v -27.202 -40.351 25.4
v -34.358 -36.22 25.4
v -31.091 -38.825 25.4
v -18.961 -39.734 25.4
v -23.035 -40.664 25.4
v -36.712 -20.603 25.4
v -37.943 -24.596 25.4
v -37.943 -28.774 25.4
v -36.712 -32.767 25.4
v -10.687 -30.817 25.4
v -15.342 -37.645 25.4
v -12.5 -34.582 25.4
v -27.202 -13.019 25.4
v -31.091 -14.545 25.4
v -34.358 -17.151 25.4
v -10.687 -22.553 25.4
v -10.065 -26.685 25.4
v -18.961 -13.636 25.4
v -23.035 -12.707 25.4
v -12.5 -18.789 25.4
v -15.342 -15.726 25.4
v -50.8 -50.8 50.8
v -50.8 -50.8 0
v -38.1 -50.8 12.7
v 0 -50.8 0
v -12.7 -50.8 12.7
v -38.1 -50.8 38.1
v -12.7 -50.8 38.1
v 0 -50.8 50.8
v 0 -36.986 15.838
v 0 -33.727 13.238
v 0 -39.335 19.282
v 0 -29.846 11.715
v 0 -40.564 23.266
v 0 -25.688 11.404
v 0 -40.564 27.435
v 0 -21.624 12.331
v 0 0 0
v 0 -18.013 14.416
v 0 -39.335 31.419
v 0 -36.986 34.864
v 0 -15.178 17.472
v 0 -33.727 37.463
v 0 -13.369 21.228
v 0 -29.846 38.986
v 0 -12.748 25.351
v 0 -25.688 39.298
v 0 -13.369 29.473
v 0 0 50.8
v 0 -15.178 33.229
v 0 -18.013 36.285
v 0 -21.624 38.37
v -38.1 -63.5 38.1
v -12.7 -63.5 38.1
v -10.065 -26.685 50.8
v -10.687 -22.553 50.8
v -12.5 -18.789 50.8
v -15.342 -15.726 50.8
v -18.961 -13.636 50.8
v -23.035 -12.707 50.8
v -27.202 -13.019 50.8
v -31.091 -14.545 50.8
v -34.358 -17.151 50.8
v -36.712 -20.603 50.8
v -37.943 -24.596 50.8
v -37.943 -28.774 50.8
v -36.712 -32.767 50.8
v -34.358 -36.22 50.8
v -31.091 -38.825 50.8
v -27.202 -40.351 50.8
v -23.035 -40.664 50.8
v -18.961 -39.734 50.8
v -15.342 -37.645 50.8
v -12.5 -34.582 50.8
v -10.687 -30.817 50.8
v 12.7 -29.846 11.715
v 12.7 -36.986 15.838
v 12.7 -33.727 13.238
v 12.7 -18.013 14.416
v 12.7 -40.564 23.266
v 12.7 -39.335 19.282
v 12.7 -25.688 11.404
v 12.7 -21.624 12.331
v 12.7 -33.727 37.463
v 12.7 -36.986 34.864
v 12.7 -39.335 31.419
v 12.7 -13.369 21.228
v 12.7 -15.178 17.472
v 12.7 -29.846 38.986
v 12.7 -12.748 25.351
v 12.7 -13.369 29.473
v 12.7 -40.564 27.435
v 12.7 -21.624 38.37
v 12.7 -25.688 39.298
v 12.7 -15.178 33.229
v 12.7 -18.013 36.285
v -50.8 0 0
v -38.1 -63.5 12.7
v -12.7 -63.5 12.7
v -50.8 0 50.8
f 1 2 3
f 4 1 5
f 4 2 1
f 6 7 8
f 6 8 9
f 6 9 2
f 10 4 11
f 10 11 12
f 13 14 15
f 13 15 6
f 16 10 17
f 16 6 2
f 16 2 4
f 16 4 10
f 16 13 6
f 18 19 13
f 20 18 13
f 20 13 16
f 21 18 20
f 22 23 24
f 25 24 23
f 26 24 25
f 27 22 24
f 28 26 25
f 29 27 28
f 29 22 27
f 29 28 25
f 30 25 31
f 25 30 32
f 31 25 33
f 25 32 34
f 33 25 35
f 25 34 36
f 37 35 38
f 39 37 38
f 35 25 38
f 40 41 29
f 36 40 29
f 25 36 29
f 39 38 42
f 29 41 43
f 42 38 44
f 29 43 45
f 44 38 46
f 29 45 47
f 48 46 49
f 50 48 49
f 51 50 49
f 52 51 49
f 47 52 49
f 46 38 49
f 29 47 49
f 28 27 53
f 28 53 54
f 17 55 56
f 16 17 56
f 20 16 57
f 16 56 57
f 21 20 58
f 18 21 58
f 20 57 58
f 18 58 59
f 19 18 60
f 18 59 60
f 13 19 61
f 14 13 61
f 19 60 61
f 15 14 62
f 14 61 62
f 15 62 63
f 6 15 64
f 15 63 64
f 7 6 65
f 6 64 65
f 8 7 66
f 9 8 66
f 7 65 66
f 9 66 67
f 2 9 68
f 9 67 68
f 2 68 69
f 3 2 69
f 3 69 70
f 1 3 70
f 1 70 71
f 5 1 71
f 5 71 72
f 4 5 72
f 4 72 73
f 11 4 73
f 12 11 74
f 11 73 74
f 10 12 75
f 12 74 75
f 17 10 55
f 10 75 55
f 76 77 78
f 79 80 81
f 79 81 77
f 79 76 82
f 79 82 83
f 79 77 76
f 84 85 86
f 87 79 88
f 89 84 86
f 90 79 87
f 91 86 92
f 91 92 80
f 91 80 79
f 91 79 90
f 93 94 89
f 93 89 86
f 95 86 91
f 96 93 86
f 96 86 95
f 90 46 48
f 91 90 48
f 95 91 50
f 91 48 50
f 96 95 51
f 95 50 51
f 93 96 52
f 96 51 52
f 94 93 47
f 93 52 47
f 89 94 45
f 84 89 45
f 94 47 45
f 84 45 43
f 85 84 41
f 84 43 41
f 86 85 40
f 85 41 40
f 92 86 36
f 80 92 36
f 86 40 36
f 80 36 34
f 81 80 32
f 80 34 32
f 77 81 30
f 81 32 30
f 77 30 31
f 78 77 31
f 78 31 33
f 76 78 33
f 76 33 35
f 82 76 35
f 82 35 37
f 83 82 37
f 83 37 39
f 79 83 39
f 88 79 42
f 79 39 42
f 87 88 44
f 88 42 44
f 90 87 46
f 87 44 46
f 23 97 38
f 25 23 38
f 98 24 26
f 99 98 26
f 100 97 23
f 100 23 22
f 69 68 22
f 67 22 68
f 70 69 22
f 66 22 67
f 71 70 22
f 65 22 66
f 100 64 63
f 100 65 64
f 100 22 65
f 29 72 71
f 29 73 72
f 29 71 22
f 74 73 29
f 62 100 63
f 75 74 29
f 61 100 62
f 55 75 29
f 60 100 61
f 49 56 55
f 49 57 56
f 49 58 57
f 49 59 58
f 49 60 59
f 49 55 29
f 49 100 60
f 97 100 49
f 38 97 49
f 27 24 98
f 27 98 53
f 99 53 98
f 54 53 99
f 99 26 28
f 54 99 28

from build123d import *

# Parameters (mm, degrees)
F0_W     = 50.8
F0_H     = 50.8
F1_DEPTH = 50.8
F2_W     = 25.4
F2_H     = 25.4
F3_DEPTH = 12.7
F4_R     = 14.017658
F5_DEPTH = 25.4
F6_R     = 13.98609
F7_DEPTH = 12.7


with BuildPart() as f1:
    # F0 (on Front) → F1 (new body)
    with BuildSketch(Plane.XZ):
        with Locations((-25.4, 25.4)):
            Rectangle(F0_W, F0_H)
    extrude(amount=F1_DEPTH)

    # F2 (on face) → F3 (join)
    with BuildSketch(Plane.XZ.offset(50.8)):
        with Locations((-25.4, 25.4)):
            Rectangle(F2_W, F2_H)
    extrude(amount=F3_DEPTH)

    # F4 (on face) → F5 (cut)
    with BuildSketch(Plane.XY.offset(50.8)):
        with Locations((-24.082342, -26.685146)):
            Circle(F4_R)
    extrude(amount=-F5_DEPTH, mode=Mode.SUBTRACT)

    # F6 (on face) → F7 (join)
    with BuildSketch(Plane.YZ):
        with Locations((-26.733652, 25.350569)):
            Circle(F6_R)
    extrude(amount=F7_DEPTH)


solid = f1.part
